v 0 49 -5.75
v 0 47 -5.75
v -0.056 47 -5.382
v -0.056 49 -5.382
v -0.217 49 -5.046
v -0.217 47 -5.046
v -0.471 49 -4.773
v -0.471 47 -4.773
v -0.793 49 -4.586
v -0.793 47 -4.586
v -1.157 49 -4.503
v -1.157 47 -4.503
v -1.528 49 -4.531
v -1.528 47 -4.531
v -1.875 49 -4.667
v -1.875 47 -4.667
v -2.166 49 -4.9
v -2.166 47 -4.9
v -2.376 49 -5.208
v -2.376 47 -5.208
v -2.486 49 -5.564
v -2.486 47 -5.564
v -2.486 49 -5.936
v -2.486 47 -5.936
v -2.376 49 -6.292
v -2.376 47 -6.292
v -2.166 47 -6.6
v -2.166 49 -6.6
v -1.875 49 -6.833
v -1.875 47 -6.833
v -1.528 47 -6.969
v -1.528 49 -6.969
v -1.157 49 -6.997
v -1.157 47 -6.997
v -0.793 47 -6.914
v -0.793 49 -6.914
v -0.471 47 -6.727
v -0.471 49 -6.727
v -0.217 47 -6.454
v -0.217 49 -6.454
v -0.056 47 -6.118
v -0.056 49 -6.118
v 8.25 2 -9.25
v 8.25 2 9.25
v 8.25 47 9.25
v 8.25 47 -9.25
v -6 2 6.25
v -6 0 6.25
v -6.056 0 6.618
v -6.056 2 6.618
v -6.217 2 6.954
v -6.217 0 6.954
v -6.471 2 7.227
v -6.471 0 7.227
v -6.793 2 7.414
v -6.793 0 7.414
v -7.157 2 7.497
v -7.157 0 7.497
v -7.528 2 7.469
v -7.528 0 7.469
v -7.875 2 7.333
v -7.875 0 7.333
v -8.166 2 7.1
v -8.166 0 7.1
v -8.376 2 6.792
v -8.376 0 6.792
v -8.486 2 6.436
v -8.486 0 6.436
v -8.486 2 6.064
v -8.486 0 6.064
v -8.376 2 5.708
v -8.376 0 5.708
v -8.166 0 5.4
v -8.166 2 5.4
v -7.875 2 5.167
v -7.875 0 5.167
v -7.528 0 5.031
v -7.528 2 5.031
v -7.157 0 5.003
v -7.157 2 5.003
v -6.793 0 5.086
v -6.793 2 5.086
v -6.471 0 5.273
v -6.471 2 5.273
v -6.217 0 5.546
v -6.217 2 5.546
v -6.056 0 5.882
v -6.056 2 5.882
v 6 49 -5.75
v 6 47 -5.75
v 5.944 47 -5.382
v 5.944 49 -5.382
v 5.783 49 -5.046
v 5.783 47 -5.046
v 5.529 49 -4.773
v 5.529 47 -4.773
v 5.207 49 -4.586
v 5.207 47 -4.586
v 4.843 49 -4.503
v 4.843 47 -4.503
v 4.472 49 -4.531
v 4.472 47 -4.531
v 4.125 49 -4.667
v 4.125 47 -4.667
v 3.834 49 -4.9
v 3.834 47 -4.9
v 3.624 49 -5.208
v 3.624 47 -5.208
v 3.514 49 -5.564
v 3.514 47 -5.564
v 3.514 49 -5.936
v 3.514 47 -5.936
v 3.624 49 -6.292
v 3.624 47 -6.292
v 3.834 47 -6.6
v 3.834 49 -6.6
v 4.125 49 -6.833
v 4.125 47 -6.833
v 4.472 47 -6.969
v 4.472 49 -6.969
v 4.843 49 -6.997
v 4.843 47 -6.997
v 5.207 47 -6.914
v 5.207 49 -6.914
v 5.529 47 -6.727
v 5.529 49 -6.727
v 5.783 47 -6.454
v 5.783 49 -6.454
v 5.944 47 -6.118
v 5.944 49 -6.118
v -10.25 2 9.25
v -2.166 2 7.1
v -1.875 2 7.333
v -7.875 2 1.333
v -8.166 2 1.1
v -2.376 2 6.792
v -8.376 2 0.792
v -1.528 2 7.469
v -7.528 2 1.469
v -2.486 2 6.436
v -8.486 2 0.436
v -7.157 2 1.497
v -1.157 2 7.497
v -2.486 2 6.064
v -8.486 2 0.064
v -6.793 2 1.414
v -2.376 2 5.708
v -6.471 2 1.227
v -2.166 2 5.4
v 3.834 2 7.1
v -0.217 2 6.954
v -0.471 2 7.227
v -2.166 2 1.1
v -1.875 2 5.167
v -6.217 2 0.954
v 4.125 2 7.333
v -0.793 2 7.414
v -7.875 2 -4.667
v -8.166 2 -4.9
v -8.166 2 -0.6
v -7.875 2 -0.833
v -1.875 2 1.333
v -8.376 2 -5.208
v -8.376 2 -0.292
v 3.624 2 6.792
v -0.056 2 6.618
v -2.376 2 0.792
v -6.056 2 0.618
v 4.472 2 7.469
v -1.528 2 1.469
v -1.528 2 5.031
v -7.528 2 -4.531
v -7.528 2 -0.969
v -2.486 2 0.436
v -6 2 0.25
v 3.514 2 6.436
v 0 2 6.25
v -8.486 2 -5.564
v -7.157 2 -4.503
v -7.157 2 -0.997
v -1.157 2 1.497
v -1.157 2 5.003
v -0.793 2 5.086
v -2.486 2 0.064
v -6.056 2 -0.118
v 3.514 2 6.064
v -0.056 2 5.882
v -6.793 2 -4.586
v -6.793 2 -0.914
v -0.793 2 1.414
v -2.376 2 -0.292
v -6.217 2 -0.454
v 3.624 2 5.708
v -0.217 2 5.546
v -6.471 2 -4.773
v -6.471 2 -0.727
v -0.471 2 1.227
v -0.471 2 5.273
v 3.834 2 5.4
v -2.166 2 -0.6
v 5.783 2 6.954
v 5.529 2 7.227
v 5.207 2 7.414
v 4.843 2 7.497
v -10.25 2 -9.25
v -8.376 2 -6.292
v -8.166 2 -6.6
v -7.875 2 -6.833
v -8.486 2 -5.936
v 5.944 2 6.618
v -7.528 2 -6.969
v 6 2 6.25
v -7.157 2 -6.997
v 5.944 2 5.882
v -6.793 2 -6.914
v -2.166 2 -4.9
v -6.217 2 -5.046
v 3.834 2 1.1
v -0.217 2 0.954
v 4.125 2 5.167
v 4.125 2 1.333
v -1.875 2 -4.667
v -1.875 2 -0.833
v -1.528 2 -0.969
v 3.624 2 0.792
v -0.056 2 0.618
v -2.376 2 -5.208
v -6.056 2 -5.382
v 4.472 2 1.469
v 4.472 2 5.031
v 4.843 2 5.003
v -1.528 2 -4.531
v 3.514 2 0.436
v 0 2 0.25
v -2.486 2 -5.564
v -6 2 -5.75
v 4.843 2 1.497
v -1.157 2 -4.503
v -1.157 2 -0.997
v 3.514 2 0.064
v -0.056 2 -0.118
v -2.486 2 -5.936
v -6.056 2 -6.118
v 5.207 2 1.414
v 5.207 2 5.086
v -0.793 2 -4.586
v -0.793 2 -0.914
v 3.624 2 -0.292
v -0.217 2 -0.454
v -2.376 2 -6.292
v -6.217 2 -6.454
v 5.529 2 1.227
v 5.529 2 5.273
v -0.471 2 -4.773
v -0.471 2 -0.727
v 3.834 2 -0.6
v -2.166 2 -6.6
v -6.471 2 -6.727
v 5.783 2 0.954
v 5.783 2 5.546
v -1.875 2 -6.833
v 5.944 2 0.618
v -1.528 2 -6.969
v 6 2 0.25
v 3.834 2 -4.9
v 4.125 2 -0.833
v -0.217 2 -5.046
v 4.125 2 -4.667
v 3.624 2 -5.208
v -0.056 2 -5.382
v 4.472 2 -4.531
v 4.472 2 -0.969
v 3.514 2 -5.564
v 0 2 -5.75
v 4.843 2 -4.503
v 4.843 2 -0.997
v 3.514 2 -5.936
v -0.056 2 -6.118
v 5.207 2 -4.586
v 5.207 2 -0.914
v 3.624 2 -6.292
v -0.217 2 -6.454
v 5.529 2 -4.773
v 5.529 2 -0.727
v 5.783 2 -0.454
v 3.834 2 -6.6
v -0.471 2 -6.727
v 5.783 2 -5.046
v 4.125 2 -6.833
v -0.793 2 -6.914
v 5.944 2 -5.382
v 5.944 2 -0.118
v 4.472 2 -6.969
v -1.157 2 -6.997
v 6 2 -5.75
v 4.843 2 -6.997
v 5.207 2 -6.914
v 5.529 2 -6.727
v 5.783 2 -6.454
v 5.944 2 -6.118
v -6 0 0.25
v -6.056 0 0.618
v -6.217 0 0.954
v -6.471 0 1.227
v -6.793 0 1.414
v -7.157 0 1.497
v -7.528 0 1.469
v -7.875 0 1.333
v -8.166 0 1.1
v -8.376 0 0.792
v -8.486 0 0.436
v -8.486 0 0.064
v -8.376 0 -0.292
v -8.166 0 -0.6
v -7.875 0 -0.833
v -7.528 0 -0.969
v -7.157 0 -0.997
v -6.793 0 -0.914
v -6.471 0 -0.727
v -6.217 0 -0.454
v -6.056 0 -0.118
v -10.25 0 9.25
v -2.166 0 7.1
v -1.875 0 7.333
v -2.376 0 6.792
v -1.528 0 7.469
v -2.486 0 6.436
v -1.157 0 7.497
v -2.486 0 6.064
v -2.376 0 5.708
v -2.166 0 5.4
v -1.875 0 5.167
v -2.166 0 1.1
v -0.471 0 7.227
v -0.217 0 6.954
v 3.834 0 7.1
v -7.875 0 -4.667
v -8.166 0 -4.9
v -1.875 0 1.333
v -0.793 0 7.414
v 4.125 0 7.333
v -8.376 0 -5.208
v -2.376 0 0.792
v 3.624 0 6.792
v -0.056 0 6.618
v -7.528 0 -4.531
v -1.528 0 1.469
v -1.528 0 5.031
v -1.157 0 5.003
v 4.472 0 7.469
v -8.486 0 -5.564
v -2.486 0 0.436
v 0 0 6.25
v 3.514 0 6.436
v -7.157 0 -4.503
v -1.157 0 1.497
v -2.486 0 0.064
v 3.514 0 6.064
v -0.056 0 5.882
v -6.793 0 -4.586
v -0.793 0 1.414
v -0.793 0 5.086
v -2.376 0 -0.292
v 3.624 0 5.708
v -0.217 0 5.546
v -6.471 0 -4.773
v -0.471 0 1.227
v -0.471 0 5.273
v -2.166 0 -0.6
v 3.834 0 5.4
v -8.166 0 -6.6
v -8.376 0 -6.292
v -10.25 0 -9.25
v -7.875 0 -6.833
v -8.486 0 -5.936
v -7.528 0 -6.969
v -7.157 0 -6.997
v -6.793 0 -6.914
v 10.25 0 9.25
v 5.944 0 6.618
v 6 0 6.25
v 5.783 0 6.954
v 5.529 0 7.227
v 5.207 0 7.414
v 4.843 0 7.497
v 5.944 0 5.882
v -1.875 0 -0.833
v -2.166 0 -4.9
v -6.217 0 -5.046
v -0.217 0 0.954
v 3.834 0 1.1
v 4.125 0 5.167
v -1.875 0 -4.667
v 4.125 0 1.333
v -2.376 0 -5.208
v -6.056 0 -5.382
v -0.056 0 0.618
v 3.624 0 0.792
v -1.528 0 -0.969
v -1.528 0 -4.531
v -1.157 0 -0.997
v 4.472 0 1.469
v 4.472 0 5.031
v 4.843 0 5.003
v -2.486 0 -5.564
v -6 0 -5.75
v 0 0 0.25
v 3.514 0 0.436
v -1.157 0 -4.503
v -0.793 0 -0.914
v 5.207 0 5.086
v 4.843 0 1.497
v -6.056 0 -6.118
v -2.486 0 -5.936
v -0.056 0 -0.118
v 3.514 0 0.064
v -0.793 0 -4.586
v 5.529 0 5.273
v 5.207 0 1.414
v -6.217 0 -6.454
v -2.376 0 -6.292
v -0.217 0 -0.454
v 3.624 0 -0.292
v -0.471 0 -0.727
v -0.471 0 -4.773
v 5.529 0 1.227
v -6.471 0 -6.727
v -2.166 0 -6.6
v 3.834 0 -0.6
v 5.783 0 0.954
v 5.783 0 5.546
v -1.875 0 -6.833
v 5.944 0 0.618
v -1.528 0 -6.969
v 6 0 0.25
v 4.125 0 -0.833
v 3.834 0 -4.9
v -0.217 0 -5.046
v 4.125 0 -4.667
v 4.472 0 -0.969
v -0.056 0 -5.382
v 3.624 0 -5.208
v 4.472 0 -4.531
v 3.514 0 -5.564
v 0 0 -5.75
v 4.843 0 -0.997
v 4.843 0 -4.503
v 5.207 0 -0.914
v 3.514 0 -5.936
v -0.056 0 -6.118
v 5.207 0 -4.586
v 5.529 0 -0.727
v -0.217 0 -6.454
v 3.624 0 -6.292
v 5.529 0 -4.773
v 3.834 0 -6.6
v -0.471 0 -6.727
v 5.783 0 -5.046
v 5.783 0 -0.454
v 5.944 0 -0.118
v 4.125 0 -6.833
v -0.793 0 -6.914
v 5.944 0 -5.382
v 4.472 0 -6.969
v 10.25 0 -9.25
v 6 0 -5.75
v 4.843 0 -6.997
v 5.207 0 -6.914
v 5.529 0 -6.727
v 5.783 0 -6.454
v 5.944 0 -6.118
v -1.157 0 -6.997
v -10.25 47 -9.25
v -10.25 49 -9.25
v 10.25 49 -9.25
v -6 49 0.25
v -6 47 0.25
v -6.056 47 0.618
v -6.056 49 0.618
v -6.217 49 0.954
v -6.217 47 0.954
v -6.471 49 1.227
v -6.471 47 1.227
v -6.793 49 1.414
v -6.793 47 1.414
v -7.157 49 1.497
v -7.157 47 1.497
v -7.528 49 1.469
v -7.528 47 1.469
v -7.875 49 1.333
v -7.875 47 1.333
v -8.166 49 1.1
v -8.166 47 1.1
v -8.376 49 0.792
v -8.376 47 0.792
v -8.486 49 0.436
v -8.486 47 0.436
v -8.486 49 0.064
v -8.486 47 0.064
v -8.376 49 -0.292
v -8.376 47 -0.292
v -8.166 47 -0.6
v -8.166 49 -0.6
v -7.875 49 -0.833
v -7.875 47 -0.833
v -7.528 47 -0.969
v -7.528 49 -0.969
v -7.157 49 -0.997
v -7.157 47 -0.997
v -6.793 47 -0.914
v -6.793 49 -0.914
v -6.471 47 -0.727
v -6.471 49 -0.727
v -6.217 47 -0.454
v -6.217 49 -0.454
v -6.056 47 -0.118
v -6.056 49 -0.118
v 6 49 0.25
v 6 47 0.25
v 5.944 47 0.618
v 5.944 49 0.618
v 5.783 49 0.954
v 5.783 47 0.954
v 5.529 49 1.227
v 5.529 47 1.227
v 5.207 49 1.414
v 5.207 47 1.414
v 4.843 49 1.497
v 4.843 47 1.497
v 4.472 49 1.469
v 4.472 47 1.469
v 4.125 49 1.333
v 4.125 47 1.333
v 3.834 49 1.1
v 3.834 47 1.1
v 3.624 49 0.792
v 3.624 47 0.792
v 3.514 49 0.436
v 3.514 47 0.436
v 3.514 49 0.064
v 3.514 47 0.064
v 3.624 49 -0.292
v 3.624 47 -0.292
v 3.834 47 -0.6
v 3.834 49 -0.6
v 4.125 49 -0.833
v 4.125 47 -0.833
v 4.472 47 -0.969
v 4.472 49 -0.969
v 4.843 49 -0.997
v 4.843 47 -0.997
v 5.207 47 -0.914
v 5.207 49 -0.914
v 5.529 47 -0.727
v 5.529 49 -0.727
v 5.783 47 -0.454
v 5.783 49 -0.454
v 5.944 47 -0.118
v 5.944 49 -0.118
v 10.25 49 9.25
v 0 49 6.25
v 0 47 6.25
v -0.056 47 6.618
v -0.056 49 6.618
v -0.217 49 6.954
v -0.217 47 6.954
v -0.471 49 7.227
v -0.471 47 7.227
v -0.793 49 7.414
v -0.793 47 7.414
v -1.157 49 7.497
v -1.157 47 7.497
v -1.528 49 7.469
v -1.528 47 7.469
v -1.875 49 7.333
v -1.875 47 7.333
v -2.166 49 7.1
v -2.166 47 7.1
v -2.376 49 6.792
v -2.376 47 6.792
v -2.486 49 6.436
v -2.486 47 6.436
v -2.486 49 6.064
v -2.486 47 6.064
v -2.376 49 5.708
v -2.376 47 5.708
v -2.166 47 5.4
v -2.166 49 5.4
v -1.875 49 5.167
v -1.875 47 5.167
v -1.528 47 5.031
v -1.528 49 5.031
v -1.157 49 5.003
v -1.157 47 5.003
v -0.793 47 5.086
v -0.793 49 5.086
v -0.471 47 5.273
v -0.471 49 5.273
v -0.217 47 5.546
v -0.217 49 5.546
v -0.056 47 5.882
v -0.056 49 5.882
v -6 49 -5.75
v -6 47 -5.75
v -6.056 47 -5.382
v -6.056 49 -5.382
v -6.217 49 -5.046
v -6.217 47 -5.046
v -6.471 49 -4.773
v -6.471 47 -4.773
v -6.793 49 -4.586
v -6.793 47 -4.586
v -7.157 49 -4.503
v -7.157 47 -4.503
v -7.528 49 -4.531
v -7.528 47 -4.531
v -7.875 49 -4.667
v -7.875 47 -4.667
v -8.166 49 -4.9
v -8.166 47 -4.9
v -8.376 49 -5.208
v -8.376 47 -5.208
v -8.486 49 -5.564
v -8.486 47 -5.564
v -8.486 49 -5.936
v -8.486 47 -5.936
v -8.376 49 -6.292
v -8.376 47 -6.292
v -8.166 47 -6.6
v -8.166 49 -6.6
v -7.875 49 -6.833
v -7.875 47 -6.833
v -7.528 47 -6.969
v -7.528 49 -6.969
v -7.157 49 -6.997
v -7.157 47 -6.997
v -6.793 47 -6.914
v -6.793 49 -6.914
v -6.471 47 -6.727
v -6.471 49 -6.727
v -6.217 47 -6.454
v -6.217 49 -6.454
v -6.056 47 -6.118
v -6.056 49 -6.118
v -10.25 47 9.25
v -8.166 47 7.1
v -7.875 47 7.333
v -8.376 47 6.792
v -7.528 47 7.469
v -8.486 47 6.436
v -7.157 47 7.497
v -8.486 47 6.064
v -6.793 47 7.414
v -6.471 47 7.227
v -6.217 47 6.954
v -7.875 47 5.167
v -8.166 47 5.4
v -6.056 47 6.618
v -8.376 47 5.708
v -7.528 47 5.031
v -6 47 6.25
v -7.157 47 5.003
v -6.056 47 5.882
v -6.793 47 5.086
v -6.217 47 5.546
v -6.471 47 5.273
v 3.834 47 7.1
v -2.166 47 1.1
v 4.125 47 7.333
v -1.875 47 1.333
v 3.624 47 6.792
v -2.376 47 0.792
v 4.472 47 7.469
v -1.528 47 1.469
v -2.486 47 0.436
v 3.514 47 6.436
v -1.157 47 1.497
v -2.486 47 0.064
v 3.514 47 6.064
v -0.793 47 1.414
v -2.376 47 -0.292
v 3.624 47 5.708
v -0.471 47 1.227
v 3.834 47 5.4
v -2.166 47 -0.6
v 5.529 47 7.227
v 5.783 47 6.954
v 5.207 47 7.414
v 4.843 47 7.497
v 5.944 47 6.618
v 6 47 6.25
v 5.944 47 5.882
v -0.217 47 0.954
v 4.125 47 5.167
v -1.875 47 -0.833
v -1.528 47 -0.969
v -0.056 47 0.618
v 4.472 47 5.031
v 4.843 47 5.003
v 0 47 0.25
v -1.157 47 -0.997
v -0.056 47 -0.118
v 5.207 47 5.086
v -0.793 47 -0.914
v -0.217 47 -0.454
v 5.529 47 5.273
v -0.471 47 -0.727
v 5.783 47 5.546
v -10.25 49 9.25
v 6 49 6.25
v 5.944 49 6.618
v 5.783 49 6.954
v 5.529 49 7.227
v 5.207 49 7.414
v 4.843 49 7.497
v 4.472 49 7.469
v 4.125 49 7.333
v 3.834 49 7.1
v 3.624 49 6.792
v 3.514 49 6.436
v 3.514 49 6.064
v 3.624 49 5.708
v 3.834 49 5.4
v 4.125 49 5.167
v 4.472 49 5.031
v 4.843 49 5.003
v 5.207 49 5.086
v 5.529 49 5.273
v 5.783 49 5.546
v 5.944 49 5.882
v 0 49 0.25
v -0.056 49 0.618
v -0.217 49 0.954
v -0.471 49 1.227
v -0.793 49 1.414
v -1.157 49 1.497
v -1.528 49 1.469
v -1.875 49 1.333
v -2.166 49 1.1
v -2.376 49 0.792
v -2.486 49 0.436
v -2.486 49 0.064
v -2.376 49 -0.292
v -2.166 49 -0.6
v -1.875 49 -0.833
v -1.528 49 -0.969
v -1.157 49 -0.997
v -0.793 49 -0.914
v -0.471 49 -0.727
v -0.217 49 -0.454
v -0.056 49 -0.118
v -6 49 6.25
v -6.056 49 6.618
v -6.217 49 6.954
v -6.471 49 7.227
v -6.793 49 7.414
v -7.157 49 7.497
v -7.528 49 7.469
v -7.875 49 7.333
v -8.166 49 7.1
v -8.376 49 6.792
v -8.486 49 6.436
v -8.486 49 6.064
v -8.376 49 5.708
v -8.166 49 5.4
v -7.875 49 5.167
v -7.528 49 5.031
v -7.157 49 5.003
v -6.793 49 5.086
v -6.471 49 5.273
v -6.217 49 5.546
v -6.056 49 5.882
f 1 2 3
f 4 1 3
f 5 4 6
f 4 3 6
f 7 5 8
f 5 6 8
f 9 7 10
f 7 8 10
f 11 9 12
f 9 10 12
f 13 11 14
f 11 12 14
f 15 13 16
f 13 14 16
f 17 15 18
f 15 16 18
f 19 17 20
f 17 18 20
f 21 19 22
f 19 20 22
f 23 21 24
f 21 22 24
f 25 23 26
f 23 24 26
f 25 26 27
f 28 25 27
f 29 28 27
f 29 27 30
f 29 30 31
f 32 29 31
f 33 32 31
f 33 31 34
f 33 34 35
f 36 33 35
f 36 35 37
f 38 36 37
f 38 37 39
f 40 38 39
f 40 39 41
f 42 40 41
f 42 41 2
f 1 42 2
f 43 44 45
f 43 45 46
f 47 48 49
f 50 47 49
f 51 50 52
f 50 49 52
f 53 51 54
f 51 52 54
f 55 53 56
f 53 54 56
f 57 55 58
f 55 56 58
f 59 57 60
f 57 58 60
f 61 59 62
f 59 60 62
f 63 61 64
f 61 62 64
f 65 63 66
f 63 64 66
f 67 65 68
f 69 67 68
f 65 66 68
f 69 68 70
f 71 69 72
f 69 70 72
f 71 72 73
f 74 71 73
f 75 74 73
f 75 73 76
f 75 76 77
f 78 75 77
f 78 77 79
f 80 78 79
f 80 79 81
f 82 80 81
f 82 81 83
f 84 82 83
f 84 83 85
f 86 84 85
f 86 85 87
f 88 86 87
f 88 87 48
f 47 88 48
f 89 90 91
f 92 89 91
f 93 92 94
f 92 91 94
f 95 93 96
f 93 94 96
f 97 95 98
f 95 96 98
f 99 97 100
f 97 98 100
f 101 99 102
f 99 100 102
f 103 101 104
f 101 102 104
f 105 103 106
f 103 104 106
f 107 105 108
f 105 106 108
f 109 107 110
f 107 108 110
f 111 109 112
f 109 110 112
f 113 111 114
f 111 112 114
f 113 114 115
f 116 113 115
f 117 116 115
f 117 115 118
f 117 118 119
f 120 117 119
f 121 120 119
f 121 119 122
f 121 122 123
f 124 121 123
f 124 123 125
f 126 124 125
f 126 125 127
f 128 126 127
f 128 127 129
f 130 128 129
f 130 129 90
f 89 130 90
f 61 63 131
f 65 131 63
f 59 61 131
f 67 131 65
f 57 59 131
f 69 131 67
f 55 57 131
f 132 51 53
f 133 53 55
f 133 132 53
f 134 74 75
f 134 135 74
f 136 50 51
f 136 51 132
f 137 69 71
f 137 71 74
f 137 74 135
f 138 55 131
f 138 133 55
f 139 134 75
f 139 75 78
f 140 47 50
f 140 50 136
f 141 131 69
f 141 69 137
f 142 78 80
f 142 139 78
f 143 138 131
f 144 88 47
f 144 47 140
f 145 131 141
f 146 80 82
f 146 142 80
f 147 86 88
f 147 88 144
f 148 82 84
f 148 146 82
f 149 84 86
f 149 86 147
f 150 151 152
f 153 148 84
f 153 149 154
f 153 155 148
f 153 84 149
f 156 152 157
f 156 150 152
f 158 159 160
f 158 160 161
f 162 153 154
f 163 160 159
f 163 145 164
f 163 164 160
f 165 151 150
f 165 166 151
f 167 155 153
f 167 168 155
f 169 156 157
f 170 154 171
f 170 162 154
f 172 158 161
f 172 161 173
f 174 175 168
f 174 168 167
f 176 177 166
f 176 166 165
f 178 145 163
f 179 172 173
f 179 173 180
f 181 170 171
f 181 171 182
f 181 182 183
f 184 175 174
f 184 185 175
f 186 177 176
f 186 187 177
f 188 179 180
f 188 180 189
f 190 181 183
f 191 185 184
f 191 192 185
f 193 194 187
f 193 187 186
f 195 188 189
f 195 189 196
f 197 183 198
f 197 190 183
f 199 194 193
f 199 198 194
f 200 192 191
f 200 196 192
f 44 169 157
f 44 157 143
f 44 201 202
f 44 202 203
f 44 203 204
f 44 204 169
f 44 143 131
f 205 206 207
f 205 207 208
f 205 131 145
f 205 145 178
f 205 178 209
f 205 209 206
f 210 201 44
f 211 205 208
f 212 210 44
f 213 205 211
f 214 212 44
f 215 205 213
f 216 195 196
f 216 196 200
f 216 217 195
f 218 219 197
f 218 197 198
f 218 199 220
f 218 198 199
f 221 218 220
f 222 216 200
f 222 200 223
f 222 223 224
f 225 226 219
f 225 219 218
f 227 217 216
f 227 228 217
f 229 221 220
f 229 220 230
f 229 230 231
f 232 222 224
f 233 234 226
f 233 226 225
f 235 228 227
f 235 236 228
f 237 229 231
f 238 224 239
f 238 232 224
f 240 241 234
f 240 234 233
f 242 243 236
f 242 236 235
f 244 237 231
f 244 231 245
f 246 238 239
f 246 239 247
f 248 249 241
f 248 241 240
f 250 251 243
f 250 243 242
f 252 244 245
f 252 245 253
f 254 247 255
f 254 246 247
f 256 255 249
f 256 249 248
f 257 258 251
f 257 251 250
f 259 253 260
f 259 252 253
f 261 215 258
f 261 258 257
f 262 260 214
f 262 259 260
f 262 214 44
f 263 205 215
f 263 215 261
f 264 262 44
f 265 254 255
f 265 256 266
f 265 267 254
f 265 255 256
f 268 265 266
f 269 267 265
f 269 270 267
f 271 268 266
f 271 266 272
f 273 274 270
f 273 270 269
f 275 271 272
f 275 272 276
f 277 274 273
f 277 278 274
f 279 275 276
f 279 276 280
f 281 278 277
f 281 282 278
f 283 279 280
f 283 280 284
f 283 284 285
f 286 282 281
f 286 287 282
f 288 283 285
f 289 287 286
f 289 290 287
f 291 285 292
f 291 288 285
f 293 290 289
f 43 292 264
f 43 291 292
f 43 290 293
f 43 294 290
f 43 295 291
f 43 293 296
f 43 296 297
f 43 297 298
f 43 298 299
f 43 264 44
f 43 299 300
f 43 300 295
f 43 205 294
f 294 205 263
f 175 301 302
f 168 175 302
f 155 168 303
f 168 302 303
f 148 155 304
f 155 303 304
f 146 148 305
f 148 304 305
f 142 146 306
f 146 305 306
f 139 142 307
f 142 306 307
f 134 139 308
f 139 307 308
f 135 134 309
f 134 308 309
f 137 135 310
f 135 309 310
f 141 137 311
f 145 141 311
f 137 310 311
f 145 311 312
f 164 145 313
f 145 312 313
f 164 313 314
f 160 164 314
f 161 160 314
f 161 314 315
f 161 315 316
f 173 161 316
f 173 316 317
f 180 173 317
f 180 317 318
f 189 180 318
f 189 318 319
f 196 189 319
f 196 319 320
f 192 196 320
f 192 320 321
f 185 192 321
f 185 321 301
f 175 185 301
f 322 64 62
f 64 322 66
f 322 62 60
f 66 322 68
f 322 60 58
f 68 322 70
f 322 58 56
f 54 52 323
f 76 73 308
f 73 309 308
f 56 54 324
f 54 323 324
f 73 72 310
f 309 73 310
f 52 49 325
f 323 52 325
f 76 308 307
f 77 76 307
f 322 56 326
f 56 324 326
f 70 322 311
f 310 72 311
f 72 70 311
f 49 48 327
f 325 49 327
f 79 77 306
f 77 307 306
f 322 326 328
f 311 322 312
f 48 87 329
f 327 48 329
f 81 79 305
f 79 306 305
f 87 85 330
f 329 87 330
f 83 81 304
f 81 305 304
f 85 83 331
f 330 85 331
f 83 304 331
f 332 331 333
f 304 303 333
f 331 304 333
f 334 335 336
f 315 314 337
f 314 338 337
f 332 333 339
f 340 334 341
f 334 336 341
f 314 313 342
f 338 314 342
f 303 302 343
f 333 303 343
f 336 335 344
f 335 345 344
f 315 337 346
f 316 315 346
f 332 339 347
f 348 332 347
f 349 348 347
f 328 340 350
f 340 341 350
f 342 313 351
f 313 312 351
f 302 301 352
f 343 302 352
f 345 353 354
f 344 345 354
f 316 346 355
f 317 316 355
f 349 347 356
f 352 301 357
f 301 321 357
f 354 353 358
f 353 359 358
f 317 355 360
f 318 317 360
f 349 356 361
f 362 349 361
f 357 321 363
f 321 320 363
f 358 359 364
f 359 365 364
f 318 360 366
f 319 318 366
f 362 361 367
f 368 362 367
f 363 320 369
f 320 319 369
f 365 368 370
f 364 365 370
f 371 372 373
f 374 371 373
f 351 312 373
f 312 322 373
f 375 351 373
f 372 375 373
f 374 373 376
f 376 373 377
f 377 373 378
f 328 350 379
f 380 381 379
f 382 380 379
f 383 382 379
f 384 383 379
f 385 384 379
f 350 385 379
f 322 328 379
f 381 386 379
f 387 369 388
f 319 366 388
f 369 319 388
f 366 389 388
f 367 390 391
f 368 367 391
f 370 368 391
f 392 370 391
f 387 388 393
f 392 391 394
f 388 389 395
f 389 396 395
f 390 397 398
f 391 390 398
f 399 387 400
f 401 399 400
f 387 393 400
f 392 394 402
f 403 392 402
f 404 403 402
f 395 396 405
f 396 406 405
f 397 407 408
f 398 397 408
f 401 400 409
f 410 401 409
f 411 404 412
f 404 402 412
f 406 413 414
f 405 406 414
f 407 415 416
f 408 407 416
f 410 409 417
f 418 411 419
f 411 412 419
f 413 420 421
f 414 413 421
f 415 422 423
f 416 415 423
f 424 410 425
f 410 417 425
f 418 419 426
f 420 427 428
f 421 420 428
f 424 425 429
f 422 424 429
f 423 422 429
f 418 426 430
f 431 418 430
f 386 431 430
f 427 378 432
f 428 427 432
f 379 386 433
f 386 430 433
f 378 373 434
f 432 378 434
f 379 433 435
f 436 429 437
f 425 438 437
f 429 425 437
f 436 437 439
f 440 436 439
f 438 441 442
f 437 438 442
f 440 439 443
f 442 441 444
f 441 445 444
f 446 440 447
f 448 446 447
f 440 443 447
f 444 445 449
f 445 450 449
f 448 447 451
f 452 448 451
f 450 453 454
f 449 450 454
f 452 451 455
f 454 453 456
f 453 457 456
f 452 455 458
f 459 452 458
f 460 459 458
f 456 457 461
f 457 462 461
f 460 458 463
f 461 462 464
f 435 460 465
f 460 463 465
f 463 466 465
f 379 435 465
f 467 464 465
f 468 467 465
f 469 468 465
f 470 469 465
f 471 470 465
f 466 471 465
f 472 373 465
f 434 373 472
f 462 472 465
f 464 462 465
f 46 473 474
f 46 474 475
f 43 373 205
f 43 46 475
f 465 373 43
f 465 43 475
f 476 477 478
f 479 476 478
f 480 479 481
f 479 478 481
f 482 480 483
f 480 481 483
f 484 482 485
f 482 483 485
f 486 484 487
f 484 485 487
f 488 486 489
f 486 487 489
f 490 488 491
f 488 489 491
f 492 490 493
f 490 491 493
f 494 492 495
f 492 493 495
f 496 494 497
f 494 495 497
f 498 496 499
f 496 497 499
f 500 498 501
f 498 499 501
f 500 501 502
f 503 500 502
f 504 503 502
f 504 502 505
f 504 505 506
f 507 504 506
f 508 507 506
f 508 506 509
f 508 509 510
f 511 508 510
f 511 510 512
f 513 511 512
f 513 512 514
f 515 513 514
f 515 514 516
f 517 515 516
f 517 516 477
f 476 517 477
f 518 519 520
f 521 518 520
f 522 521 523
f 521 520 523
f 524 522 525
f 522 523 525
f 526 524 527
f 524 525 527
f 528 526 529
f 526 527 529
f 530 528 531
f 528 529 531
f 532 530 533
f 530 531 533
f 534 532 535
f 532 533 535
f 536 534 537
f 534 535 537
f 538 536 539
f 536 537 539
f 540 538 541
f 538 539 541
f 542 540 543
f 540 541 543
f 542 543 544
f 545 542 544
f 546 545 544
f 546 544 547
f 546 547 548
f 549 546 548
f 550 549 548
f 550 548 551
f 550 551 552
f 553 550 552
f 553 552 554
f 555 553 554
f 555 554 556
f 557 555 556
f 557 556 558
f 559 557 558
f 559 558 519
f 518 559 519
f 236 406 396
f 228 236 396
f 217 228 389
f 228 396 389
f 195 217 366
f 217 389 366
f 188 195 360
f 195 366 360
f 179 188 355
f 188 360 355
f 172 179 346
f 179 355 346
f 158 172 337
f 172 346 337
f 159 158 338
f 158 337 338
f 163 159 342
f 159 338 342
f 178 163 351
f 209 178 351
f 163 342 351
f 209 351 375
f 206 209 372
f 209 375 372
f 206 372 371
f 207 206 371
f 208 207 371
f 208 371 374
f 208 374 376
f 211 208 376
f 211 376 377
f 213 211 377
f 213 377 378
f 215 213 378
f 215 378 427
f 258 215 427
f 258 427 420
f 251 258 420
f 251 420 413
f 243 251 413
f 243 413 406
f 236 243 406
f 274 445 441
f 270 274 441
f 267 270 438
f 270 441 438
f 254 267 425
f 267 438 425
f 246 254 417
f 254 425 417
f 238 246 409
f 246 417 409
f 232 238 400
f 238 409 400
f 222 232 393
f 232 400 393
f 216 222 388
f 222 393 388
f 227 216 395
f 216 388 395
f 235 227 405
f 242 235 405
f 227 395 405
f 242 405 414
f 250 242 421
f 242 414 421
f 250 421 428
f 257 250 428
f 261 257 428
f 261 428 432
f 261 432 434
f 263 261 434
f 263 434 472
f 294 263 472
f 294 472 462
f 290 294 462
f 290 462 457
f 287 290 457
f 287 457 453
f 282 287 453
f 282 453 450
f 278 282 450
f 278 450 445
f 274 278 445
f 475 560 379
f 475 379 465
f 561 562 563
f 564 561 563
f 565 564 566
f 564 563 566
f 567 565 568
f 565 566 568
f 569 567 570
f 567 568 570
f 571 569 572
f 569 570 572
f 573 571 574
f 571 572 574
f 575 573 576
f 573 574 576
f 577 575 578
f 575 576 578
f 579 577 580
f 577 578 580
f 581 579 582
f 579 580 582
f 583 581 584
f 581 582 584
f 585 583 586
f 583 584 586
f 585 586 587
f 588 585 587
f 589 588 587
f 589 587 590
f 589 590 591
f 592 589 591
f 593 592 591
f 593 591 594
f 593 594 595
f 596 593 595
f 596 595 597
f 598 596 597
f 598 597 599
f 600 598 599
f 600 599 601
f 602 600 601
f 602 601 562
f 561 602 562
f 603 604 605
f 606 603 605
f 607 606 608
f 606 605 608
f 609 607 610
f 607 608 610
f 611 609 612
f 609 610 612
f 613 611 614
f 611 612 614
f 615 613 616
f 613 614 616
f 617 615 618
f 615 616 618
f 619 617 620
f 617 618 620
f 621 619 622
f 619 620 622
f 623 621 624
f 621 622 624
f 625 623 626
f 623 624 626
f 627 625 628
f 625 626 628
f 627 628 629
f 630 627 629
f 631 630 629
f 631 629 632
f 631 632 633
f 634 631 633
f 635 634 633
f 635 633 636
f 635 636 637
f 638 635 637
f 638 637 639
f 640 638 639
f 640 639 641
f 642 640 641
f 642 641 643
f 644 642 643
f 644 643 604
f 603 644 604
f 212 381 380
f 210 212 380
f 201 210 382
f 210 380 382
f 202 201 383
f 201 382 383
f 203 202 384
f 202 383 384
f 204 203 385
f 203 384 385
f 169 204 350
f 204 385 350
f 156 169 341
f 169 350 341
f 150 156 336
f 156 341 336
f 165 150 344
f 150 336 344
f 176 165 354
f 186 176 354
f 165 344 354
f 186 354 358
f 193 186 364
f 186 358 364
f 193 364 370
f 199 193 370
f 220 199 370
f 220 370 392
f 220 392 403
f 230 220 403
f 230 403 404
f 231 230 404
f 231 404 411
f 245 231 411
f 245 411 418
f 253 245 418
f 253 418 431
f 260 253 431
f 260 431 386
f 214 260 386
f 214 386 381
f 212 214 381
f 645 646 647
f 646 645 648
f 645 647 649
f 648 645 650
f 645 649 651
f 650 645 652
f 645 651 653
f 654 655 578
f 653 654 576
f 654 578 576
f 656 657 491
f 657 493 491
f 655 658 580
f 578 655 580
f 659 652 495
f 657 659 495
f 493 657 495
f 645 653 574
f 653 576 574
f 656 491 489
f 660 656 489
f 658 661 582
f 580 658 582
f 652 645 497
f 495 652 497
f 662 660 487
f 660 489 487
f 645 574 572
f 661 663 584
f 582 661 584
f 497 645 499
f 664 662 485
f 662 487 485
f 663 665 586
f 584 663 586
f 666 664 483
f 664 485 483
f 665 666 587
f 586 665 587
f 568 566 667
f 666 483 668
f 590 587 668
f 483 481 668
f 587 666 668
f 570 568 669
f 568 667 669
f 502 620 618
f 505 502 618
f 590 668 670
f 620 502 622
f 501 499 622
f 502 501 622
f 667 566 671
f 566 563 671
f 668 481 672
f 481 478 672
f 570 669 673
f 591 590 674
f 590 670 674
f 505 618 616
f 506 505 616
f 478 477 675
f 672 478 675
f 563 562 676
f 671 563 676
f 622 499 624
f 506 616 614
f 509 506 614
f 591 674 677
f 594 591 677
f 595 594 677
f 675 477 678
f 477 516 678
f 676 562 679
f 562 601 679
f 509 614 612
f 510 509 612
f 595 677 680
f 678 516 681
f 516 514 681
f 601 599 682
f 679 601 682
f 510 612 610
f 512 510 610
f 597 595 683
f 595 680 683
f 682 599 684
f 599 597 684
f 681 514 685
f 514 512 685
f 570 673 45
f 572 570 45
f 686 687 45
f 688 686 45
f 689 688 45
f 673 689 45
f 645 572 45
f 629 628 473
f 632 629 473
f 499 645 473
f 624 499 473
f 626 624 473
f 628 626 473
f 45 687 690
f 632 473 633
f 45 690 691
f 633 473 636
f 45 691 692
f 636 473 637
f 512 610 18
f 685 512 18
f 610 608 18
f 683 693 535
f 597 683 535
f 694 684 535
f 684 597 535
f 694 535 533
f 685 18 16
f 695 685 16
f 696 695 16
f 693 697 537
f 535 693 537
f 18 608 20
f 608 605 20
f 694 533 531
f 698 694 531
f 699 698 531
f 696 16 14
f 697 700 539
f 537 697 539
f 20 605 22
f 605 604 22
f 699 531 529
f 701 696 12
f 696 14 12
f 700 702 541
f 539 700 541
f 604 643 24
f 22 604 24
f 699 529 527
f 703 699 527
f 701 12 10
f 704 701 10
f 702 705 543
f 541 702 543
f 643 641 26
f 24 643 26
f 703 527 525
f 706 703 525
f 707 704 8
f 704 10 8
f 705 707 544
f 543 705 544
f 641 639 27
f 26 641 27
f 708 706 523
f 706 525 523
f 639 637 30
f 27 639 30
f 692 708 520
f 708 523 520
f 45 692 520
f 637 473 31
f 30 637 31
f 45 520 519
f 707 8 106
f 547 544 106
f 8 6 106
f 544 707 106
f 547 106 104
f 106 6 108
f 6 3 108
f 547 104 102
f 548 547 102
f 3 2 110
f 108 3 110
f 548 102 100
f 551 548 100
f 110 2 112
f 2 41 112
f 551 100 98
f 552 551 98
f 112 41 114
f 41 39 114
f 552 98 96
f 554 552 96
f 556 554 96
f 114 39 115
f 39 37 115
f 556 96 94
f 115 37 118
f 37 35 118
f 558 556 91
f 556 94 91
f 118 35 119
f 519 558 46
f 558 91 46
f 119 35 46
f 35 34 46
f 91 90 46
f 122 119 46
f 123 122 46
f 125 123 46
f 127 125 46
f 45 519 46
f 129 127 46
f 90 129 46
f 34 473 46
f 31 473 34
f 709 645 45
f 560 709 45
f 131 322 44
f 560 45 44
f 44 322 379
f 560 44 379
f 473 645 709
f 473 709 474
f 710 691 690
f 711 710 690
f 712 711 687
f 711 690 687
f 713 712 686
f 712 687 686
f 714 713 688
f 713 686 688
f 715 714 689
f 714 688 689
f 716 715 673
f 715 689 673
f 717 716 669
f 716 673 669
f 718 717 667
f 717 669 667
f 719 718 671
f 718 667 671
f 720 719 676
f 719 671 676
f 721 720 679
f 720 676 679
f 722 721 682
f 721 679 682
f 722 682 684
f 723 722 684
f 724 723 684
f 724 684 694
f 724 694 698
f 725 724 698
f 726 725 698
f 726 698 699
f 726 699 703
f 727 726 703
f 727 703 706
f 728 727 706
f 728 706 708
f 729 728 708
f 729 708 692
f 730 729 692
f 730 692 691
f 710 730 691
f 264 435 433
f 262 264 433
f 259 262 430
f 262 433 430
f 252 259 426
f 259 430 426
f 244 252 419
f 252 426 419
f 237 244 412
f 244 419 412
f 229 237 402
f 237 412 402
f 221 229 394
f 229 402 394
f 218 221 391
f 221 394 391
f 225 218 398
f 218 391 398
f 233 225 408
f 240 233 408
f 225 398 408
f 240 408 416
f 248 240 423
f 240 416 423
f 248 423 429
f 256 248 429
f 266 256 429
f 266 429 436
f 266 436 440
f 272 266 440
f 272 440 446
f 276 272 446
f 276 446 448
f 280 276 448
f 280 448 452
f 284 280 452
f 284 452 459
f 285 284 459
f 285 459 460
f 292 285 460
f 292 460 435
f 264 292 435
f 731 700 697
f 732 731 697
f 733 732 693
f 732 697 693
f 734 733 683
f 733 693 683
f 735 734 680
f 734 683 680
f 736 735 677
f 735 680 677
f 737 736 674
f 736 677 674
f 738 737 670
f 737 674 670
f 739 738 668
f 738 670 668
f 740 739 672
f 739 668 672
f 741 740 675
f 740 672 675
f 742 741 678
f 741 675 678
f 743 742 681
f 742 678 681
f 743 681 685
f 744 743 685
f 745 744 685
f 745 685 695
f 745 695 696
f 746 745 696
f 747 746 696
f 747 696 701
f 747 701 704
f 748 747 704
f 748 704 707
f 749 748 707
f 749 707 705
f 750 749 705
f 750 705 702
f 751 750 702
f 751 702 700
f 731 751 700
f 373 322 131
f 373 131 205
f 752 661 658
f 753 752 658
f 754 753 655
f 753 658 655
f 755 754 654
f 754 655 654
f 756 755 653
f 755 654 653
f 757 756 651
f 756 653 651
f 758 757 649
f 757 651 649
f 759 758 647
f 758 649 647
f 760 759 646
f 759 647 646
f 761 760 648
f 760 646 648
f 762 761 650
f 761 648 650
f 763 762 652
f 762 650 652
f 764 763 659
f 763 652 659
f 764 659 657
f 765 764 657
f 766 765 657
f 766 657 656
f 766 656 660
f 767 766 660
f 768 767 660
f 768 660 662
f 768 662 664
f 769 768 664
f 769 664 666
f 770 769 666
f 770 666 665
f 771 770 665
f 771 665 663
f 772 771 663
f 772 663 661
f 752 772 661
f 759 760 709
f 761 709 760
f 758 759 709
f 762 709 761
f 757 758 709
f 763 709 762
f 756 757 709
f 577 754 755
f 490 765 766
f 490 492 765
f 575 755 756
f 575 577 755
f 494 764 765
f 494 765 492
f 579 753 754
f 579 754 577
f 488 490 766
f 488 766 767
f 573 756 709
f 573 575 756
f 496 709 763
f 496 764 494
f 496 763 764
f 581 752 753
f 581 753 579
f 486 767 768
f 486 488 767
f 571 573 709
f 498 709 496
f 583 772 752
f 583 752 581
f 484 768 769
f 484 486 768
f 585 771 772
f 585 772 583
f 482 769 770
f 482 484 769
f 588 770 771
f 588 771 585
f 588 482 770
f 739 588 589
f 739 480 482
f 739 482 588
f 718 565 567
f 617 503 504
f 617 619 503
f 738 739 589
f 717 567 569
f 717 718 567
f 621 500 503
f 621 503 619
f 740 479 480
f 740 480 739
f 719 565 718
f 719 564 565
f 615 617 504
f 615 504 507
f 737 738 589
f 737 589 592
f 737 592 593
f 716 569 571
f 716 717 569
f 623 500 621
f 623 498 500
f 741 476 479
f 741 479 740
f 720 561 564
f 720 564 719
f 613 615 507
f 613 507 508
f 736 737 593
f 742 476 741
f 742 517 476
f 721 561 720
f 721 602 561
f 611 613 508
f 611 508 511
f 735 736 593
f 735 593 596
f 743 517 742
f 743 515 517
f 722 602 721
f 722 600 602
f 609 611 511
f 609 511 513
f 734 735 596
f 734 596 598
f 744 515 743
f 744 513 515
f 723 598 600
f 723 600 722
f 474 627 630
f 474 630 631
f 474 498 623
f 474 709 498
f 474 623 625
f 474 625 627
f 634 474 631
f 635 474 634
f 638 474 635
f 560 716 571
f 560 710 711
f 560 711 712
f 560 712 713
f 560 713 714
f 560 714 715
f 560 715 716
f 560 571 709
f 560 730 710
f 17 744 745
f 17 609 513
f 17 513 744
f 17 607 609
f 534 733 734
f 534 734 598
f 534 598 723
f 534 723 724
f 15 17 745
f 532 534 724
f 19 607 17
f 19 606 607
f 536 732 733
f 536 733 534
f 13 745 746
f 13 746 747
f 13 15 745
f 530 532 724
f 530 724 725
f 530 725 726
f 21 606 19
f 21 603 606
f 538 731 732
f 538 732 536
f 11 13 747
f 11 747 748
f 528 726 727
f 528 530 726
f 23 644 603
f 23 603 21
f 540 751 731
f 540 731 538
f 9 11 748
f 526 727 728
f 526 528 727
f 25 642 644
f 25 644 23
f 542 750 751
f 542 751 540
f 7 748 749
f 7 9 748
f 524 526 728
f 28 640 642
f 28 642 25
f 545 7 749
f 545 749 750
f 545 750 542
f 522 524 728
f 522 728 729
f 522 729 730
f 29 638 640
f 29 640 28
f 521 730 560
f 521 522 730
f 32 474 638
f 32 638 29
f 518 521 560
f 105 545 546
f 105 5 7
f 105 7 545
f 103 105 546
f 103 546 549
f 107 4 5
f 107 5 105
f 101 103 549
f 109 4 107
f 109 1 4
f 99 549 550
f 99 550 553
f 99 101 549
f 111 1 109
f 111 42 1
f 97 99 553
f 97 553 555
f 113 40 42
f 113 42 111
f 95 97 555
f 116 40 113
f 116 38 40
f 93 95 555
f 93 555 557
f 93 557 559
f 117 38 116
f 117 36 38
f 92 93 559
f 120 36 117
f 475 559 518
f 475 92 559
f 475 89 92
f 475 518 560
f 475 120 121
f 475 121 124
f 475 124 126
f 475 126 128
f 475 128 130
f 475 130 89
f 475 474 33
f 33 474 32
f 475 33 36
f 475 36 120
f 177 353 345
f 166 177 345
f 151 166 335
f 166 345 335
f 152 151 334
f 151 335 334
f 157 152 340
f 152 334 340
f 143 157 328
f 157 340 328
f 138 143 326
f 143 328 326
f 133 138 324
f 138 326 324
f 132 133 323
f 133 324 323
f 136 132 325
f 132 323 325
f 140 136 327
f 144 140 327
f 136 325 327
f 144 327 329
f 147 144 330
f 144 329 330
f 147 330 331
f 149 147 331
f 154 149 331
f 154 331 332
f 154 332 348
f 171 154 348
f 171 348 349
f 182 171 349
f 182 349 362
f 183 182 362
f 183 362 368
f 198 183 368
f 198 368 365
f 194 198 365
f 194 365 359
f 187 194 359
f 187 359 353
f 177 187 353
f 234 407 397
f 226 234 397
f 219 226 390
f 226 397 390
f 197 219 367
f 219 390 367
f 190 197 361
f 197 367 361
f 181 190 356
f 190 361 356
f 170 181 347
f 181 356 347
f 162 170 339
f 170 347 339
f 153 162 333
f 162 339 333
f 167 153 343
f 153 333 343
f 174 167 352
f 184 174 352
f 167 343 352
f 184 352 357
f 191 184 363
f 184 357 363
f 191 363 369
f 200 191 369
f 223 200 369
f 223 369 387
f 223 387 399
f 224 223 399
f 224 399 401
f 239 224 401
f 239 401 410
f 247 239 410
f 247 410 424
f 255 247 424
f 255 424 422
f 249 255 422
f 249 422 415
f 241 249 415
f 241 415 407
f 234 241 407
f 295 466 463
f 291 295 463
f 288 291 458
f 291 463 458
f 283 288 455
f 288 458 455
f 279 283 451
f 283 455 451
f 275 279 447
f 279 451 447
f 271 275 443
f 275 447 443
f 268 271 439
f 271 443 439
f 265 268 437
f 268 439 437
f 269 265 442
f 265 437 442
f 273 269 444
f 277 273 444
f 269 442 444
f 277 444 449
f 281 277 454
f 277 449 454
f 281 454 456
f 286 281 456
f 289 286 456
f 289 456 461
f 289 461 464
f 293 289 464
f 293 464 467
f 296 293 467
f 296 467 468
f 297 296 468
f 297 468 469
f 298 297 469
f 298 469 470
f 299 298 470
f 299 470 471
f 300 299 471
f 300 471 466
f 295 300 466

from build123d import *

# Parameters (mm, degrees)
SKETCH1_W            = 20.5
SKETCH1_H            = 18.5
BOSS_EXTRUDE1_DEPTH  = 2
SKETCH2_W            = 2
SKETCH2_H            = 18.5
BOSS_EXTRUDE2_DEPTH  = 45
SKETCH4_W            = 20.5
SKETCH4_H            = 18.5
BOSS_EXTRUDE3_DEPTH  = 2
SKETCH3_R            = 1.25
CUT_EXTRUDE1_DEPTH   = 50
LPATTERN1_COUNT      = 3
LPATTERN1_PITCH      = 6
LPATTERN1_COUNT_DIR2 = 3
LPATTERN1_PITCH_DIR2 = 6


with BuildPart() as part:
    # Sketch1 → Boss-Extrude1 (new body)
    with BuildSketch(Plane(origin=(0, 0, 0), x_dir=(1, 0, 0), z_dir=(0, 1, 0))):
        Rectangle(SKETCH1_W, SKETCH1_H)
    extrude(amount=BOSS_EXTRUDE1_DEPTH)

    # Sketch2 → Boss-Extrude2 (add)
    with BuildSketch(Plane(origin=(0, 2, 0), x_dir=(1, 0, 0), z_dir=(0, 1, 0))):
        with Locations((9.25, 0)):
            Rectangle(SKETCH2_W, SKETCH2_H)
    extrude(amount=BOSS_EXTRUDE2_DEPTH)

    # Sketch4 → Boss-Extrude3 (add)
    with BuildSketch(Plane(origin=(0, 47, 0), x_dir=(1, 0, 0), z_dir=(0, 1, 0))):
        Rectangle(SKETCH4_W, SKETCH4_H)
    extrude(amount=BOSS_EXTRUDE3_DEPTH)

    # Sketch3 → Cut-Extrude1 (cut, through all)
    with BuildSketch(Plane.XZ):
        with Locations((-7.25, 6.25)):
            Circle(SKETCH3_R)
    cut_extrude1 = extrude(amount=-CUT_EXTRUDE1_DEPTH, mode=Mode.SUBTRACT)

    # LPattern1: Cut-Extrude1 3 × 3
    with Locations(*[(j * LPATTERN1_PITCH_DIR2, 0, -i * LPATTERN1_PITCH) for i in range(LPATTERN1_COUNT) for j in range(LPATTERN1_COUNT_DIR2) if (i, j) != (0, 0)]):
        add(cut_extrude1, mode=Mode.SUBTRACT)


solid = part.part
